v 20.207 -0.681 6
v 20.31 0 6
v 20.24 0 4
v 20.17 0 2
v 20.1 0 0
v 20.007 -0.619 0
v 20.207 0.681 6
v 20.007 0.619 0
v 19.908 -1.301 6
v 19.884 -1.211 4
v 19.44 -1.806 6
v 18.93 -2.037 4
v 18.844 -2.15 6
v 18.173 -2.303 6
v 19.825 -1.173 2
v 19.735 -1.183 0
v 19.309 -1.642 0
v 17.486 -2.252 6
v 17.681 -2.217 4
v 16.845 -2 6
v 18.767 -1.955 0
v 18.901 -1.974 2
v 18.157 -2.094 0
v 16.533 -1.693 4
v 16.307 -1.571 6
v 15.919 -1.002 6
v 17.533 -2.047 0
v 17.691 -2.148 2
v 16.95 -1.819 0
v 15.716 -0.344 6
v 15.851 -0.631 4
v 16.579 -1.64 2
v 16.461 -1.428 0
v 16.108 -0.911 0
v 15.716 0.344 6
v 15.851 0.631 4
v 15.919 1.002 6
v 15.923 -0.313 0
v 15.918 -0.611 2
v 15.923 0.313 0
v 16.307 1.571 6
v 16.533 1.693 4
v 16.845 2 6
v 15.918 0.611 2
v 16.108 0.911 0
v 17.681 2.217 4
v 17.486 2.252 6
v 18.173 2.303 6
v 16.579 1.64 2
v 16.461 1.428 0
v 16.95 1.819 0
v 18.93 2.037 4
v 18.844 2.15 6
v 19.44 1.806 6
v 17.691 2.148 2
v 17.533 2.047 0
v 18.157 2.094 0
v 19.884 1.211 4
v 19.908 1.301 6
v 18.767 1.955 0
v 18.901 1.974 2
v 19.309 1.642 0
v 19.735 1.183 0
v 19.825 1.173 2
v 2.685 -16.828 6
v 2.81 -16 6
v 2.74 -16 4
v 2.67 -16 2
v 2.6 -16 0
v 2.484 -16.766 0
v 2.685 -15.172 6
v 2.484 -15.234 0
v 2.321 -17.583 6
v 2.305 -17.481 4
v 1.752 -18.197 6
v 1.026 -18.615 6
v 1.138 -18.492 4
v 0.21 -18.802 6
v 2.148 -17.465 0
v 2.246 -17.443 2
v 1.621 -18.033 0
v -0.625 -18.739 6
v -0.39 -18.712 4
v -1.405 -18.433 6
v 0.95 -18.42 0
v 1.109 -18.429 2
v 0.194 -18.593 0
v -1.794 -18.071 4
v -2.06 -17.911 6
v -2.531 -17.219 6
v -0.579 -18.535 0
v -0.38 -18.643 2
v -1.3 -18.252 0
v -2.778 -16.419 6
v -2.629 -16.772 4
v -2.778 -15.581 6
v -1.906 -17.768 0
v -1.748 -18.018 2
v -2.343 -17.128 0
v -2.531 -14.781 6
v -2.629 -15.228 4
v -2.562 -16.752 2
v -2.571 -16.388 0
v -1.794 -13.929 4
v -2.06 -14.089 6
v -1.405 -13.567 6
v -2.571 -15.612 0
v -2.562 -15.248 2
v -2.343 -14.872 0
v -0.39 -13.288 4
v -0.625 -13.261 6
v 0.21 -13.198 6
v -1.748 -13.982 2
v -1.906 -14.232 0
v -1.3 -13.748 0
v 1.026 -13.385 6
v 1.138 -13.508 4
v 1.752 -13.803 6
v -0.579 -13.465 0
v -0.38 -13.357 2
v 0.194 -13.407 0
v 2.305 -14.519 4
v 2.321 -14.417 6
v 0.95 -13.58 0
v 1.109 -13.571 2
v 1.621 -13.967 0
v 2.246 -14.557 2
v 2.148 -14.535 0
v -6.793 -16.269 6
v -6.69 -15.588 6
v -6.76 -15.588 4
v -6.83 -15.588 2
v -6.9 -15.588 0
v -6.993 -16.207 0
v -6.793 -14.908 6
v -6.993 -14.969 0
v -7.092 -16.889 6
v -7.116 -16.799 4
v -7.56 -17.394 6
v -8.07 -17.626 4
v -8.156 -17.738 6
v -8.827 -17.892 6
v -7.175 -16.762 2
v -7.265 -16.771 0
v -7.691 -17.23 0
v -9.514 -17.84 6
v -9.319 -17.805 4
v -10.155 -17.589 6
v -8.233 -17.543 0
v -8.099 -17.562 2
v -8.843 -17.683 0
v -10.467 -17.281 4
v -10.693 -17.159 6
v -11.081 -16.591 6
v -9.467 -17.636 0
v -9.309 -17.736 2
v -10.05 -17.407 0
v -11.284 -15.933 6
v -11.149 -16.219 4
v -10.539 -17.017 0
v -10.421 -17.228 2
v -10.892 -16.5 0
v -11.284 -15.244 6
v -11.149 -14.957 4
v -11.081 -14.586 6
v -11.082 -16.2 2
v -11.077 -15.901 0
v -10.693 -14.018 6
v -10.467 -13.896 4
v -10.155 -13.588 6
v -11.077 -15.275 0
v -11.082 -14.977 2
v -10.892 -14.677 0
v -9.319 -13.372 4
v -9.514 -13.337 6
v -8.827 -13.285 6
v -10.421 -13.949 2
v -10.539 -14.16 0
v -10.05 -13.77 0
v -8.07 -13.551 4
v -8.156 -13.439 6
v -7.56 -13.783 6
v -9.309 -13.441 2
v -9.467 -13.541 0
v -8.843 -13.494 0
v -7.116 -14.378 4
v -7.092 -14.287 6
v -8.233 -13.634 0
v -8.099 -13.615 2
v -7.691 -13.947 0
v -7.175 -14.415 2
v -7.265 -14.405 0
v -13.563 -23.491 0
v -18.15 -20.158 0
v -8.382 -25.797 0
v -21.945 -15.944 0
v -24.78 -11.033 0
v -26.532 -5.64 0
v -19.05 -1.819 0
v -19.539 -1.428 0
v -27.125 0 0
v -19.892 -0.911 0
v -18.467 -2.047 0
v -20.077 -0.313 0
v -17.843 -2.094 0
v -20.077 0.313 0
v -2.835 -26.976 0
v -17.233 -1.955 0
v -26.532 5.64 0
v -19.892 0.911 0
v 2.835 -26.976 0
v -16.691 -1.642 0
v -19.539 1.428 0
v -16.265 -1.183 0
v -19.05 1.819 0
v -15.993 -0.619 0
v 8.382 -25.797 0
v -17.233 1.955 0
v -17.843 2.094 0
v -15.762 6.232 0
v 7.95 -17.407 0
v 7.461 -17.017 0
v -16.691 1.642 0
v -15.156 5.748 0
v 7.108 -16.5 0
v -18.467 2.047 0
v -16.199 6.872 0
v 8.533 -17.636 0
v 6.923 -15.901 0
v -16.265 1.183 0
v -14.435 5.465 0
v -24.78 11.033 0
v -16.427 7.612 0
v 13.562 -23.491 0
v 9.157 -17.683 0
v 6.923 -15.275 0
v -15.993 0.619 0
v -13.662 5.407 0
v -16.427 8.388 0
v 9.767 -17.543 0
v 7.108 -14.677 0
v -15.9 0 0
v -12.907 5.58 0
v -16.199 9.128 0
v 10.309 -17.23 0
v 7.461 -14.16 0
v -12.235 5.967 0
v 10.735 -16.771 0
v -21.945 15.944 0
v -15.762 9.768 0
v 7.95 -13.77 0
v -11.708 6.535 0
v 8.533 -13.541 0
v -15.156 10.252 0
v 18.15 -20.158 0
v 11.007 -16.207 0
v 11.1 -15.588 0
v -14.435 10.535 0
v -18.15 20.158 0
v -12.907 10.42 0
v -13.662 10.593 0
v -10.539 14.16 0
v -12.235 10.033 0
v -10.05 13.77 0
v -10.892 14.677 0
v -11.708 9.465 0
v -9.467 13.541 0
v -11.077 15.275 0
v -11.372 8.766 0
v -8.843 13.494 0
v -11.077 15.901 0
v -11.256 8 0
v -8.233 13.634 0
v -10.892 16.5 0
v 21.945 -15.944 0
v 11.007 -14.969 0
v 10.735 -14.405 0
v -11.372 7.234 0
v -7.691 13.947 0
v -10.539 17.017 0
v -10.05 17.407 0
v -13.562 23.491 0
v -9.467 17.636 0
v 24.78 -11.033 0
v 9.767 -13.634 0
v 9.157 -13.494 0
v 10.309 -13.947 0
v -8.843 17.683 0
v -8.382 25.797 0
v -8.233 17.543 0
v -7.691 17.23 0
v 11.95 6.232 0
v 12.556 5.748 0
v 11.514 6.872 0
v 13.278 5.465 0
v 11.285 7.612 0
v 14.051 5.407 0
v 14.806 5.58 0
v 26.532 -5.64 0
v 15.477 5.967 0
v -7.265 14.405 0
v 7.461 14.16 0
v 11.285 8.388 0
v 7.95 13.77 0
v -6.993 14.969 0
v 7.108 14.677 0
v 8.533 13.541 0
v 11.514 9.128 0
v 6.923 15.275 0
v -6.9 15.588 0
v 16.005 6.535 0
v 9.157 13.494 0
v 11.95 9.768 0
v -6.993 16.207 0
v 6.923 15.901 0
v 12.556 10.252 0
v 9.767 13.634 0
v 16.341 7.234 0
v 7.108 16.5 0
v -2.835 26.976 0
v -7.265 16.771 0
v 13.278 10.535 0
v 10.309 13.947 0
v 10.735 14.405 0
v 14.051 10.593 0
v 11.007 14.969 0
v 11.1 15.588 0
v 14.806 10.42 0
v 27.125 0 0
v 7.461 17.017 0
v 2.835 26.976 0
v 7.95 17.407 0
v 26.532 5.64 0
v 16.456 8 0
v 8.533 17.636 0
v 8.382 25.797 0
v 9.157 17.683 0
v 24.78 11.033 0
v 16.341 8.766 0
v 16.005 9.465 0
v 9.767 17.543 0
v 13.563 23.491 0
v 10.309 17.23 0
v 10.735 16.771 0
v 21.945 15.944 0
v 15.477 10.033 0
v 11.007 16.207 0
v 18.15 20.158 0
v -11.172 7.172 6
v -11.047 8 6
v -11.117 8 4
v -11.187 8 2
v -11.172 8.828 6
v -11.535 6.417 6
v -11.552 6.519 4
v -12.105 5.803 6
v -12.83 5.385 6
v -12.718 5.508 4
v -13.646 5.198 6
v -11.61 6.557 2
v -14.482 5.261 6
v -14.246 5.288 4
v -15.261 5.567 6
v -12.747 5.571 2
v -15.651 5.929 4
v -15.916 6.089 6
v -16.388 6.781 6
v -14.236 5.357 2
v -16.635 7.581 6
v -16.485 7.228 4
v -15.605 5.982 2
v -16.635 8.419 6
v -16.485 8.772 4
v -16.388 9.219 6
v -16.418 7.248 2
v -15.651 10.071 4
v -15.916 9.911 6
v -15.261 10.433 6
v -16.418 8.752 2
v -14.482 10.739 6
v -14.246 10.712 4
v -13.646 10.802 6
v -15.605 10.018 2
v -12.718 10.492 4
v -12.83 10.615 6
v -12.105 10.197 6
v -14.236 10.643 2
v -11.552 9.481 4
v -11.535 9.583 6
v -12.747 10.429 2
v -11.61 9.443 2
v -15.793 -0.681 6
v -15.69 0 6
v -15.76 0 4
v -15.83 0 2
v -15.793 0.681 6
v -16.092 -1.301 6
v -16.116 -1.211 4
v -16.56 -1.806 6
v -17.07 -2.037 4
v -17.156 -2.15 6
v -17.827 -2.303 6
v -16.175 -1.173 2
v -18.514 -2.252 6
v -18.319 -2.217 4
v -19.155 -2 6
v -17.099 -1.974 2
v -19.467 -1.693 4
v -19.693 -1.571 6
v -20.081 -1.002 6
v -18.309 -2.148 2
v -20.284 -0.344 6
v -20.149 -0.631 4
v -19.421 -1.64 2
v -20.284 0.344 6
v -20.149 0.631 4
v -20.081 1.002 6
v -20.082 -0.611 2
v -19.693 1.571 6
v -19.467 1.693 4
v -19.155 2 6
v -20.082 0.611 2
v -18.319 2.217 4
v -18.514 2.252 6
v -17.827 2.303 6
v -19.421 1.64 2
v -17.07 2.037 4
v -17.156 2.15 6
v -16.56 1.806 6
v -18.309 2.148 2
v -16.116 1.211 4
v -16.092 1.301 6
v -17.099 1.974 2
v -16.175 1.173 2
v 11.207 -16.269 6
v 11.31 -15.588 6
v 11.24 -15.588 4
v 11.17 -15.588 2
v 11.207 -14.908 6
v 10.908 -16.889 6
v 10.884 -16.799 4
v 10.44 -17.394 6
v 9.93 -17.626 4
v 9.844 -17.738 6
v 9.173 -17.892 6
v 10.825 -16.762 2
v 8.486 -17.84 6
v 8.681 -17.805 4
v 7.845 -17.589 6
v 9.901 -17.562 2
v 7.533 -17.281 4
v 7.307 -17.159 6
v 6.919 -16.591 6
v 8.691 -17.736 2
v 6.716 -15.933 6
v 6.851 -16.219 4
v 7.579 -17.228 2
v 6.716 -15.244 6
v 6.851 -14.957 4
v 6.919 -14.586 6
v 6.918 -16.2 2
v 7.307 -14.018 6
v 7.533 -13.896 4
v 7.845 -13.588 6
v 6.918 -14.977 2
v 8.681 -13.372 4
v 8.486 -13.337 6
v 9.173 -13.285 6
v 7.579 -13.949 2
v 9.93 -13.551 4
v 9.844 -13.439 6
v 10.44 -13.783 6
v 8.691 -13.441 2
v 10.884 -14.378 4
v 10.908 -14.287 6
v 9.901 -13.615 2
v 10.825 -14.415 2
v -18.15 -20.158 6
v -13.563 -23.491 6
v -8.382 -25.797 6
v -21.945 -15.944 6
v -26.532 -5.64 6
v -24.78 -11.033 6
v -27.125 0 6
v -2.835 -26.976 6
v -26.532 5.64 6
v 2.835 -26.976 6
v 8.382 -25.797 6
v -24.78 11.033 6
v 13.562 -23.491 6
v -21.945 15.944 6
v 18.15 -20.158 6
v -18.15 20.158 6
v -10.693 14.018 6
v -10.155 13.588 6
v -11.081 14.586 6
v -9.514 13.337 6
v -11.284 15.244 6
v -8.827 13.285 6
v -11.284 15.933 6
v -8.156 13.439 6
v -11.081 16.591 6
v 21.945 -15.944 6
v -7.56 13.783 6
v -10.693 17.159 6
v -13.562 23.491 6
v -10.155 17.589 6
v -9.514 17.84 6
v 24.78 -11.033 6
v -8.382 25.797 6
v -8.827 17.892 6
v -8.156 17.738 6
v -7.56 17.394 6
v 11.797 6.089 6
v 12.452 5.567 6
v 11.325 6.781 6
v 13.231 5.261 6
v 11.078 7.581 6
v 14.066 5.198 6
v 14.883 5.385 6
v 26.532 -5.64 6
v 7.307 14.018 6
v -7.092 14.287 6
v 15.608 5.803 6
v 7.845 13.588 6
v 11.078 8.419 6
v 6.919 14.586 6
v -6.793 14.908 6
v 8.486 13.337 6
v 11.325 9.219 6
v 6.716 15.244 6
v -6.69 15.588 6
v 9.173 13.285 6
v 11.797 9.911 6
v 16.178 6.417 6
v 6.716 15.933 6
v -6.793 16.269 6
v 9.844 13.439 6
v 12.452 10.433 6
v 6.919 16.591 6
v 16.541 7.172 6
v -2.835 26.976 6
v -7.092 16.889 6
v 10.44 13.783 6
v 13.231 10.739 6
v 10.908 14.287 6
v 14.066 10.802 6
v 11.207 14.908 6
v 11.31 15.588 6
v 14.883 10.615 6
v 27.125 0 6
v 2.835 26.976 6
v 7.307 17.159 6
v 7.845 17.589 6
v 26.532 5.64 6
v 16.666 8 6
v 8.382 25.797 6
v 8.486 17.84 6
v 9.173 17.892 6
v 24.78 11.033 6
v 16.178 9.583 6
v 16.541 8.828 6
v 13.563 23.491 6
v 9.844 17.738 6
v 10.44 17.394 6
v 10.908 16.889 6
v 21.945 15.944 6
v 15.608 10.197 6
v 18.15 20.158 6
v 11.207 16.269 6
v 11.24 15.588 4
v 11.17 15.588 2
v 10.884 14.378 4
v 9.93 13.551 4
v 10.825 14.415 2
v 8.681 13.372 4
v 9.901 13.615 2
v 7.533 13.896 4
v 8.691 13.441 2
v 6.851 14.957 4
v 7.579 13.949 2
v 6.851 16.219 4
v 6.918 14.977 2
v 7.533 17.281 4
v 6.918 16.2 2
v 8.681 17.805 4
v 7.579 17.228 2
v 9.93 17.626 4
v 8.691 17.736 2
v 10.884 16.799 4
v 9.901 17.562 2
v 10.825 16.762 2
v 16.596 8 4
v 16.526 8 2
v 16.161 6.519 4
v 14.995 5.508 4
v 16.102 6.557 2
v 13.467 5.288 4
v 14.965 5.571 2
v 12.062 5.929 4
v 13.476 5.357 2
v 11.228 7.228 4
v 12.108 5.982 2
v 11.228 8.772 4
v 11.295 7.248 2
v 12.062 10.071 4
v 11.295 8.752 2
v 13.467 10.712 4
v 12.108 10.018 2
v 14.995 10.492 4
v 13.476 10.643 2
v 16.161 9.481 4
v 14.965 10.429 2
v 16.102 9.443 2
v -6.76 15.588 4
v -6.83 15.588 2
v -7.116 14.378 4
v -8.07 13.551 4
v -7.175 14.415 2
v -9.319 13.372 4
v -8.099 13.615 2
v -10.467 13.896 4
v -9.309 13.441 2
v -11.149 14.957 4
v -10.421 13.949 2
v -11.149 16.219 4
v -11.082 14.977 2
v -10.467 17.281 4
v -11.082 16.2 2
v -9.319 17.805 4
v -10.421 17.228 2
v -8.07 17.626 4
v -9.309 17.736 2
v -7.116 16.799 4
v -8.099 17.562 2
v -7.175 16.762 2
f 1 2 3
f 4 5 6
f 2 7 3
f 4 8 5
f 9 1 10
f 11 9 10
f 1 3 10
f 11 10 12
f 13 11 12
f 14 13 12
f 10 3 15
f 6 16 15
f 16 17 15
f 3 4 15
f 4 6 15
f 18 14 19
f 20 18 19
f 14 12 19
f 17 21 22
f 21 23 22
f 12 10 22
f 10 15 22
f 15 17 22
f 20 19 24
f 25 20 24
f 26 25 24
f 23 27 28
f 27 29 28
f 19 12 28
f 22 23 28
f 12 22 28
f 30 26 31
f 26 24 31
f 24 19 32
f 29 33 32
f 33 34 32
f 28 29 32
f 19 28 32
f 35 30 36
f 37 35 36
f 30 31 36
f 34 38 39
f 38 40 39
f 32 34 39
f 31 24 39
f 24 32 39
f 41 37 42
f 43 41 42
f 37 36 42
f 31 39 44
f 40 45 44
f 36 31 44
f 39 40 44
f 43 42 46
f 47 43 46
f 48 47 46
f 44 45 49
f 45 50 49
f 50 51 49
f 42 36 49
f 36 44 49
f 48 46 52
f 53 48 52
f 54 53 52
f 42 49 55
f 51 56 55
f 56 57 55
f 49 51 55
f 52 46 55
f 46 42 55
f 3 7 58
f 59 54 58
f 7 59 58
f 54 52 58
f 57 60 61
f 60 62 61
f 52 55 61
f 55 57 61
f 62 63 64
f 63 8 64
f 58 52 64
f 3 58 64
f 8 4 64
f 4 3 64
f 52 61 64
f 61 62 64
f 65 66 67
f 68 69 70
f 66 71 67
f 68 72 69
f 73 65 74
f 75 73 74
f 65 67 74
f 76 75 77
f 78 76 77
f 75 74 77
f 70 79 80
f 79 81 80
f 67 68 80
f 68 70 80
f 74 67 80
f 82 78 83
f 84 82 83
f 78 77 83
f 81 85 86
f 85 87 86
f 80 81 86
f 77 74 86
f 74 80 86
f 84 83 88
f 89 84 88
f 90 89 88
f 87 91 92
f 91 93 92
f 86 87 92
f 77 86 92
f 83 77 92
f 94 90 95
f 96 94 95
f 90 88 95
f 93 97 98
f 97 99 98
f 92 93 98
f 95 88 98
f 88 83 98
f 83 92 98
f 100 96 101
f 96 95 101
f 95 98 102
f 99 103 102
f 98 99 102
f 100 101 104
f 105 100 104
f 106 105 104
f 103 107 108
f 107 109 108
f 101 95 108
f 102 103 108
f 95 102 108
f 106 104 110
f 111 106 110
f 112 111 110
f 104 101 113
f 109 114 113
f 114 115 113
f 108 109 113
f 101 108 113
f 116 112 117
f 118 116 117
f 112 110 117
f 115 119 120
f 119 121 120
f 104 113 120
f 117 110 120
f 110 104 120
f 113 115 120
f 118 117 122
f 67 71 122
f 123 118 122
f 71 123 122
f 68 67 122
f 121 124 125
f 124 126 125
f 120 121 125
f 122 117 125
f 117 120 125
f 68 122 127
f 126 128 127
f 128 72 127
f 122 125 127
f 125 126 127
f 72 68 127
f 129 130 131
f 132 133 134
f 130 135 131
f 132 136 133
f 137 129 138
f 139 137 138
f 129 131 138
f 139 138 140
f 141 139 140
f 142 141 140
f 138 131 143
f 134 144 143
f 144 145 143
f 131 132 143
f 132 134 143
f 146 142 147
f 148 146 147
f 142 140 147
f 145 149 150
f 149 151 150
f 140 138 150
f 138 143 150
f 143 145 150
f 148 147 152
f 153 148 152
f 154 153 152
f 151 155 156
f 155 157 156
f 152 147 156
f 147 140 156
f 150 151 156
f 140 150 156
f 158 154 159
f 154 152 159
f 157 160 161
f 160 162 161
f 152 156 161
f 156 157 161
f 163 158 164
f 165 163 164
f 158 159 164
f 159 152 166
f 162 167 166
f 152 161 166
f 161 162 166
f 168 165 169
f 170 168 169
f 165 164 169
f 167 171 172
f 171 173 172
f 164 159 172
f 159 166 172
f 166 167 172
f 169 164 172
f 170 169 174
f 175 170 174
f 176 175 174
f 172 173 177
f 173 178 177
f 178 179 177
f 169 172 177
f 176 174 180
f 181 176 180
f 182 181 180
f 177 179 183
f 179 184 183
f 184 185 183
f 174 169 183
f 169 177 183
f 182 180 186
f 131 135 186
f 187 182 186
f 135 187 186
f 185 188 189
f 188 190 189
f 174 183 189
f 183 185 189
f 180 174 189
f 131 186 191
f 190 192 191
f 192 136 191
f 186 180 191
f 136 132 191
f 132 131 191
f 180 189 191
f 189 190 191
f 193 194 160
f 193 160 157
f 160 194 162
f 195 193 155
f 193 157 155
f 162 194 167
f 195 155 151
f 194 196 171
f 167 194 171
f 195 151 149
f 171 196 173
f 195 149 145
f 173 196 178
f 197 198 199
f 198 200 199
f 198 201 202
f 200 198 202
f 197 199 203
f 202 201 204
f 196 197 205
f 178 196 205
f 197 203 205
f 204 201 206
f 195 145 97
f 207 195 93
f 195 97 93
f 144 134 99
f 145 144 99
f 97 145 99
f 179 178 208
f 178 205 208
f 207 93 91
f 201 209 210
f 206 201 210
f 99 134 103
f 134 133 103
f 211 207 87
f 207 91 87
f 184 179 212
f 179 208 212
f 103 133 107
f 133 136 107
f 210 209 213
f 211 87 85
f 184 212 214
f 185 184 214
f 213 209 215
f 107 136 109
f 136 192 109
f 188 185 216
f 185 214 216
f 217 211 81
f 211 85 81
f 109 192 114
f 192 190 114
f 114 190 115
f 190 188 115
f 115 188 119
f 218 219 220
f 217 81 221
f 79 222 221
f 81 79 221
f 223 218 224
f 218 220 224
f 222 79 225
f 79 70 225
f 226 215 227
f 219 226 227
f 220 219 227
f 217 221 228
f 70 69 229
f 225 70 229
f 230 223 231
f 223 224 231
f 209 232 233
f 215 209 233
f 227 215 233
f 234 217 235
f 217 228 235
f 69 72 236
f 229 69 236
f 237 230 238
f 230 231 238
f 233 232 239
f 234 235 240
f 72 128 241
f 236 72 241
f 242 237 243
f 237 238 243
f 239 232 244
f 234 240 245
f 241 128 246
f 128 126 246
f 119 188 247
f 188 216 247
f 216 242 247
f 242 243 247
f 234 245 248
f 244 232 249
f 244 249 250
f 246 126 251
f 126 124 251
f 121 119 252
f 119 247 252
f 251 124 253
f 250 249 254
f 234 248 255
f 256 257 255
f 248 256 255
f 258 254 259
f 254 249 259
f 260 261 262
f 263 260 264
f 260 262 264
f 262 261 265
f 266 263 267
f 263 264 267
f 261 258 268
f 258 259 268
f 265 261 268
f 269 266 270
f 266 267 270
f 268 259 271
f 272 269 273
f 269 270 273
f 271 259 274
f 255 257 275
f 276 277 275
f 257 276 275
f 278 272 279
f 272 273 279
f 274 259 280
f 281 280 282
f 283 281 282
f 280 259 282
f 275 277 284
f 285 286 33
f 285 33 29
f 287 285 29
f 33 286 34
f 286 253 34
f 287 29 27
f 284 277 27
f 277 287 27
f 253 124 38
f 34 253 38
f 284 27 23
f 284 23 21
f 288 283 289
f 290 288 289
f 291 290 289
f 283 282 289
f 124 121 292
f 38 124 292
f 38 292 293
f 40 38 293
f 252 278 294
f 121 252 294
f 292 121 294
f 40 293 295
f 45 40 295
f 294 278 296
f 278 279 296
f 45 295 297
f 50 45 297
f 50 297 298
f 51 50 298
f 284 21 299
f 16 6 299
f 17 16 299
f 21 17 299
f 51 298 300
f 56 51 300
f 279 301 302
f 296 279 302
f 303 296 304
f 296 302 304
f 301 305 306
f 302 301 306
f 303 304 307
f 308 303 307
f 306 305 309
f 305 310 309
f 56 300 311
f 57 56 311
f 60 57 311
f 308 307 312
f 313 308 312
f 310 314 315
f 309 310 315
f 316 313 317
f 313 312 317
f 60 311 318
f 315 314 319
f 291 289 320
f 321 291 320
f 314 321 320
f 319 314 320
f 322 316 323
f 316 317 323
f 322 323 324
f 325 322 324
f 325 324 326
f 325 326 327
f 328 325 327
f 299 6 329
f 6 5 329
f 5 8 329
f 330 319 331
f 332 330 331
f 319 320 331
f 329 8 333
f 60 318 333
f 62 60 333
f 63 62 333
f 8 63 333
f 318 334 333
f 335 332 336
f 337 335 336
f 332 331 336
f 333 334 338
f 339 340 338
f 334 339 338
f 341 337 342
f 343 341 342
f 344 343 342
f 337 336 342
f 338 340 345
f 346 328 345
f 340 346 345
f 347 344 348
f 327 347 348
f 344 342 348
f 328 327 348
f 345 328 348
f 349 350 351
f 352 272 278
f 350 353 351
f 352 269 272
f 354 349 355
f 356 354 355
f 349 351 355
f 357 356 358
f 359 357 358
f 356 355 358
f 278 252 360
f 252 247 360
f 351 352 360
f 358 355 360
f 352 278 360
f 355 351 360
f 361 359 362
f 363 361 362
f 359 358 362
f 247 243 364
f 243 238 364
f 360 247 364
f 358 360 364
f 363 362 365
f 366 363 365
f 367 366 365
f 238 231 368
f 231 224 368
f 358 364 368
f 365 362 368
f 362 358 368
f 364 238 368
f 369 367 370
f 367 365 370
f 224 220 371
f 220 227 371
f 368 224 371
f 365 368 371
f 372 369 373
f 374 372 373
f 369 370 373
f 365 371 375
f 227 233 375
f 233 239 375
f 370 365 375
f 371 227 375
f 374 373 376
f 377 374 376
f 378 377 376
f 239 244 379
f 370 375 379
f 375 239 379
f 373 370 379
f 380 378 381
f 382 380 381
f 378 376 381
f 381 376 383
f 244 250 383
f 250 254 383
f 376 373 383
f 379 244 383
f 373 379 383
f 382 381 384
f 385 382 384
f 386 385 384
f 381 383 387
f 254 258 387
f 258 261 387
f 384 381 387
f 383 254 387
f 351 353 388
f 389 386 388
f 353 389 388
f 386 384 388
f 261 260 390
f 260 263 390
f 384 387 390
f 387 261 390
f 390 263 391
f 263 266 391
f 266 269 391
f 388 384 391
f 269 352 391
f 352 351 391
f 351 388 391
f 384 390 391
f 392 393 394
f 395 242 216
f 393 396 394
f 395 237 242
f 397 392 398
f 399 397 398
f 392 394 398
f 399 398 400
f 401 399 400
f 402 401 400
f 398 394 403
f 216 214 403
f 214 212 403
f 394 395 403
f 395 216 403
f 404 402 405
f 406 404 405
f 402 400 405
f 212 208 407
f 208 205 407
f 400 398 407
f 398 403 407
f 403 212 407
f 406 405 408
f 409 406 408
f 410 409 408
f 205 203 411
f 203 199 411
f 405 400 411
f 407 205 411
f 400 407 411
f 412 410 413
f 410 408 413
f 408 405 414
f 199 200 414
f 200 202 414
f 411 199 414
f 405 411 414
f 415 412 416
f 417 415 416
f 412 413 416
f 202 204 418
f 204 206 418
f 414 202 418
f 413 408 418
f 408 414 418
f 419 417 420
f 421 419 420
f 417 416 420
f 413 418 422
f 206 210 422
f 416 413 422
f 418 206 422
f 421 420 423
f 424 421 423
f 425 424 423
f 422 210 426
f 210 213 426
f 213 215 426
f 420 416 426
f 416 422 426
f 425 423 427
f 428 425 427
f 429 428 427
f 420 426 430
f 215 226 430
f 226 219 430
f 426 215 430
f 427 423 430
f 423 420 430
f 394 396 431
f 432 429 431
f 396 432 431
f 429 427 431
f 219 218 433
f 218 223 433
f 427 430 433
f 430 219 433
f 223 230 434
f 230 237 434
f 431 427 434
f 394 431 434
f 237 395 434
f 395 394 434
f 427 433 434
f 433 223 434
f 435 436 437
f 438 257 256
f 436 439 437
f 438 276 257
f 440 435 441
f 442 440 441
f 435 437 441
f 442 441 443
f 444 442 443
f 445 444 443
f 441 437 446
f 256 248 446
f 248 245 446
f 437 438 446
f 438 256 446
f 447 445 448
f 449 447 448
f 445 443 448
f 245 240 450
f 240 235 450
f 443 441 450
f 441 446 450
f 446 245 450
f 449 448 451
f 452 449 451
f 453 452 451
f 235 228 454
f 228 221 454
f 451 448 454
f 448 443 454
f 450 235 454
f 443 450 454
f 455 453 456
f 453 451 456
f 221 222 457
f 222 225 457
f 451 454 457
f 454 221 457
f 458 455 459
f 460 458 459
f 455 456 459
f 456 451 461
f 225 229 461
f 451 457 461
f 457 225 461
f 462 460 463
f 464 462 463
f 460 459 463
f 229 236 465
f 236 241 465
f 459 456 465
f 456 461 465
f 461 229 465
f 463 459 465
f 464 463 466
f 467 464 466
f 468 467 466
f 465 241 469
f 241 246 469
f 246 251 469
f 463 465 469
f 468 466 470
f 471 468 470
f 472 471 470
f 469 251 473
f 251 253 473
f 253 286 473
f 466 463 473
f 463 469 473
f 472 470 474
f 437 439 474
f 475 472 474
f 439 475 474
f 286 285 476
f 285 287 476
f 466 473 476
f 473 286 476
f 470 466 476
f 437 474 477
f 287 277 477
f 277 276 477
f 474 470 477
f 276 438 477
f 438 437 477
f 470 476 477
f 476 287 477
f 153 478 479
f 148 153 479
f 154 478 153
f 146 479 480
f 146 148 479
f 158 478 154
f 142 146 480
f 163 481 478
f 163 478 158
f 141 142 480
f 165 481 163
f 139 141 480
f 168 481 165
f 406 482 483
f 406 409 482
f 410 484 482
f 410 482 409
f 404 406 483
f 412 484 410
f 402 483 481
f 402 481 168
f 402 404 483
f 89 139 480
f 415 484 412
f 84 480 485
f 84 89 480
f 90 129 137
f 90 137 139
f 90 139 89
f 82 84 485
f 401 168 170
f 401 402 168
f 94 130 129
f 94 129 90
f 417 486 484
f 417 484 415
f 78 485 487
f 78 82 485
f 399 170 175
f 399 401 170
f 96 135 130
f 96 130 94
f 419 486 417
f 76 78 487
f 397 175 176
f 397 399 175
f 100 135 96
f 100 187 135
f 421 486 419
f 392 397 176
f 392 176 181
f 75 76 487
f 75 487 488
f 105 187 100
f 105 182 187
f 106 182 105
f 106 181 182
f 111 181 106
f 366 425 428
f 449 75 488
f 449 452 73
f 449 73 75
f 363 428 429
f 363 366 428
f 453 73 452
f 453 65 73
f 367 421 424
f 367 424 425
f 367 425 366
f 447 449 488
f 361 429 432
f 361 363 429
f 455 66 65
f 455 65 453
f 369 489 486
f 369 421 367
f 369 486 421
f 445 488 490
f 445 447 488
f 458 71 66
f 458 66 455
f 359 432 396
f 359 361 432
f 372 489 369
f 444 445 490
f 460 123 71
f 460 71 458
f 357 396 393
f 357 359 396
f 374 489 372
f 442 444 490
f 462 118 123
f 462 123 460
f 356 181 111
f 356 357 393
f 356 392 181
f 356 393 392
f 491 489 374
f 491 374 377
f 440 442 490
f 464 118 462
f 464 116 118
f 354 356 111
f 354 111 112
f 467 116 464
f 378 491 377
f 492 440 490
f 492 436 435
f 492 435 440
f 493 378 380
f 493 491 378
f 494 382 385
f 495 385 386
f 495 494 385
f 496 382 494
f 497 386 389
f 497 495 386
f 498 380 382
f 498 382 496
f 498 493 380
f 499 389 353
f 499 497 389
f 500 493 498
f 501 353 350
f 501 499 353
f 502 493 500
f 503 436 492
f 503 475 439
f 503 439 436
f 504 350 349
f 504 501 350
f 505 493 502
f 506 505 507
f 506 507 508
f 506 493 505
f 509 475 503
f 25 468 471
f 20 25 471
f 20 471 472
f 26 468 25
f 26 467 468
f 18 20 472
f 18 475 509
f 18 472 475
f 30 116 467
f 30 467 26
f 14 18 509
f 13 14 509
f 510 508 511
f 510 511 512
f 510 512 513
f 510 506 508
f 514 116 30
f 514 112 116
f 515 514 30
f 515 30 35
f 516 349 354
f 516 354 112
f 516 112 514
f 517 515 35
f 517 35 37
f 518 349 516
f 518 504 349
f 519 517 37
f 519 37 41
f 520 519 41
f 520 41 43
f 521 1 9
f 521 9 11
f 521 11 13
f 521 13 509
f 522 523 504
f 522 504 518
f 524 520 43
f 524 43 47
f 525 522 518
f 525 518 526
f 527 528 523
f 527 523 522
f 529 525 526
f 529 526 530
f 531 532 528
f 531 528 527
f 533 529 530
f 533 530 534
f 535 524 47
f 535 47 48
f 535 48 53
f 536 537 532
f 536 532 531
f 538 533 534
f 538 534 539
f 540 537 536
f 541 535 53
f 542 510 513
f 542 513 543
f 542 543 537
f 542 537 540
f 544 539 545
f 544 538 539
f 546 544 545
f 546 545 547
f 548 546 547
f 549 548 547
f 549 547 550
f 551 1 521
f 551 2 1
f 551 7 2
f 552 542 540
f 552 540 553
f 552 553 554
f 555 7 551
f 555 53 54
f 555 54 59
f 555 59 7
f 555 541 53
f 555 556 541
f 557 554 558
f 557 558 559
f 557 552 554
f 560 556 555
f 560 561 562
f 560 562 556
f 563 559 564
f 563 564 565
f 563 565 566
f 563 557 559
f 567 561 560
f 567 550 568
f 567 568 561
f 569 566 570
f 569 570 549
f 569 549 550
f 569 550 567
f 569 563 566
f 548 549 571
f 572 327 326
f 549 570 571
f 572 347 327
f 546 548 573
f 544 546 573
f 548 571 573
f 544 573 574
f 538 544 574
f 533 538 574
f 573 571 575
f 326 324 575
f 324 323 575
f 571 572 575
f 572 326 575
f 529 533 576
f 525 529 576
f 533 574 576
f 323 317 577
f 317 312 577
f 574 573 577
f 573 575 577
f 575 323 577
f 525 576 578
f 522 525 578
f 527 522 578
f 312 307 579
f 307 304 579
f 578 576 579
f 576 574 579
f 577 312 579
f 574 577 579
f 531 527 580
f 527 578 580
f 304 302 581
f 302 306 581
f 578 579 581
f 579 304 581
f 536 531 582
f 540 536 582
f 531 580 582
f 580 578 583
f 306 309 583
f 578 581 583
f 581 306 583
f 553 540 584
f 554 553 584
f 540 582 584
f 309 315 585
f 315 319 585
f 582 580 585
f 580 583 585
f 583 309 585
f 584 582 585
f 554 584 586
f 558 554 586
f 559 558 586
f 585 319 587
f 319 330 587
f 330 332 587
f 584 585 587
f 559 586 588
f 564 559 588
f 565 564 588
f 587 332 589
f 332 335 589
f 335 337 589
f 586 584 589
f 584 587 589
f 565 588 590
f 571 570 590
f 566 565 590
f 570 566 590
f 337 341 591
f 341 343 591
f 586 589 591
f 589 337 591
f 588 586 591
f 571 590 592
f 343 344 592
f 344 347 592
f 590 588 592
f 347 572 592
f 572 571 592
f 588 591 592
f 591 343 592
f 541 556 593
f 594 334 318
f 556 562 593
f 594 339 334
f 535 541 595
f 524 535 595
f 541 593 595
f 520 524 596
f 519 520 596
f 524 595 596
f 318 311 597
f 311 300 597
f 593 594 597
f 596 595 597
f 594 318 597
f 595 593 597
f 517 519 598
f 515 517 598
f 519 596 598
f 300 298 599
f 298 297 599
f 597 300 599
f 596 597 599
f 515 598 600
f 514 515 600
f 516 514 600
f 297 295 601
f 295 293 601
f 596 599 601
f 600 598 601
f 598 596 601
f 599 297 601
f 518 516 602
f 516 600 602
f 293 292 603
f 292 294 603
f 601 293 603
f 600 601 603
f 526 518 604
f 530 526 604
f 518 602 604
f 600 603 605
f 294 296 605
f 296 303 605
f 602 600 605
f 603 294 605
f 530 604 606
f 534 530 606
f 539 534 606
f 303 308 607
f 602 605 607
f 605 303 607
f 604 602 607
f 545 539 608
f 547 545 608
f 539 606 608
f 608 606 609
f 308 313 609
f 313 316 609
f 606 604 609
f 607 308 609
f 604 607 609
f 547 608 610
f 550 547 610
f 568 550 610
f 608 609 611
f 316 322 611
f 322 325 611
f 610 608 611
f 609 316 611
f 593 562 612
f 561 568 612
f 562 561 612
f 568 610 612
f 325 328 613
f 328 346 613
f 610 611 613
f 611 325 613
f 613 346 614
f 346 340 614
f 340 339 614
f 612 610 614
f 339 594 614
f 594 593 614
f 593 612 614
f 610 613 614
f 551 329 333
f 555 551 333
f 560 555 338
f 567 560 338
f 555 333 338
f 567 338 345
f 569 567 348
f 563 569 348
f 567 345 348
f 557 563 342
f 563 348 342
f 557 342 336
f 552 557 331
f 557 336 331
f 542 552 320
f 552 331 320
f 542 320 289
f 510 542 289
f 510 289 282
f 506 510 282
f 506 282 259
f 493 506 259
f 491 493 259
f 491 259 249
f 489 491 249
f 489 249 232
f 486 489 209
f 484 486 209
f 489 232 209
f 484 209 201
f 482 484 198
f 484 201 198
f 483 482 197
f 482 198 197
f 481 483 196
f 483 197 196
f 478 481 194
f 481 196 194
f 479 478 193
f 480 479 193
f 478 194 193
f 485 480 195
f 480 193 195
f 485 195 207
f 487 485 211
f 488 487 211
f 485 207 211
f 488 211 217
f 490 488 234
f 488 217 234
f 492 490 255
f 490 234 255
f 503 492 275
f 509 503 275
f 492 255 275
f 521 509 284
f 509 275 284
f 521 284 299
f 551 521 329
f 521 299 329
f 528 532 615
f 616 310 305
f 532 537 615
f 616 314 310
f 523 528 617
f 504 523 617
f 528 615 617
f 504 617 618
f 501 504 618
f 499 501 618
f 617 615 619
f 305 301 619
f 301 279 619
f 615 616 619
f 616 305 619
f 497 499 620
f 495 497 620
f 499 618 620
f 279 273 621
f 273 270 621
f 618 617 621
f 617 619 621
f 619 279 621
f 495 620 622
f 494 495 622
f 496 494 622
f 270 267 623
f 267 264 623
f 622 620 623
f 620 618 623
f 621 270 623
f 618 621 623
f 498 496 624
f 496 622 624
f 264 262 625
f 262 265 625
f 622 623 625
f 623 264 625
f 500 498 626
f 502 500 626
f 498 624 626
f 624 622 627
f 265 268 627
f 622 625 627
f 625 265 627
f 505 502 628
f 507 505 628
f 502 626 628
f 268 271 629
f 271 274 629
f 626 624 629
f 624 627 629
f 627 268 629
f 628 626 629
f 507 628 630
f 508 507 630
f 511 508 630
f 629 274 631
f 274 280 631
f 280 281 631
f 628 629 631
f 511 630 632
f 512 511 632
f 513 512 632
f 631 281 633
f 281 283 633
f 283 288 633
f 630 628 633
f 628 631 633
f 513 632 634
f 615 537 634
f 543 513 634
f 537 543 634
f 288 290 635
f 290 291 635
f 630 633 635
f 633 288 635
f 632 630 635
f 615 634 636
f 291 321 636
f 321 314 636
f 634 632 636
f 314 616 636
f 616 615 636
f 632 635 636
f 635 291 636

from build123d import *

# Parameters (mm, degrees)
SKETCH1_R                    = 27.125
BOSS_EXTRUDE1_DEPTH          = 6
CUT_EXTRUDE1_START           = 6
SKETCH2_R                    = 2.6
CUT_EXTRUDE1_DEPTH           = 45.826939745
CUT_EXTRUDE1_DRAFT           = 2
CUT_EXTRUDE1_PROFILE_2_DEPTH = 45.826939745
CUT_EXTRUDE1_PROFILE_2_DRAFT = 2
CUT_EXTRUDE1_PROFILE_3_DEPTH = 45.826939745
CUT_EXTRUDE1_PROFILE_3_DRAFT = 2
SKETCH2_R_2                  = 2.1
CUT_EXTRUDE1_PROFILE_4_DEPTH = 45.826939745
CUT_EXTRUDE1_PROFILE_4_DRAFT = 2
CUT_EXTRUDE1_PROFILE_5_DEPTH = 45.826939745
CUT_EXTRUDE1_PROFILE_5_DRAFT = 2
CUT_EXTRUDE1_PROFILE_6_DEPTH = 45.826939745
CUT_EXTRUDE1_PROFILE_6_DRAFT = 2
CUT_EXTRUDE1_PROFILE_7_DEPTH = 45.826939745
CUT_EXTRUDE1_PROFILE_7_DRAFT = 2
CUT_EXTRUDE1_PROFILE_8_DEPTH = 45.826939745
CUT_EXTRUDE1_PROFILE_8_DRAFT = 2
CUT_EXTRUDE1_PROFILE_9_DEPTH = 45.826939745
CUT_EXTRUDE1_PROFILE_9_DRAFT = 2


with BuildPart() as part:
    # Sketch1 → Boss-Extrude1 (new body)
    with BuildSketch(Plane(origin=(0, 0, 0), x_dir=(0, 1, 0), z_dir=(0, 0, 1))):
        with Locations(Location((0, 0, 0), (0, 0, 270))):
            Circle(SKETCH1_R)
    extrude(amount=BOSS_EXTRUDE1_DEPTH)


with BuildPart() as cut_extrude1_tool:
    # Sketch2 → Cut-Extrude1 (with draft: the straight prism first)
    with BuildSketch(Plane(origin=(0, 0, 6), x_dir=(1, 0, 0), z_dir=(0, 0, -1)).offset(CUT_EXTRUDE1_START)):
        with Locations((0, 16)):
            Circle(SKETCH2_R)
    extrude(amount=-CUT_EXTRUDE1_DEPTH)
    # Cut-Extrude1: the draft: its side faces are tilted about the plane it starts from
    cut_extrude1_sides = [cut_extrude1_tool.faces().sort_by_distance(p)[0] for p in [
        (-2.6, -16, 22.913469873),
    ]]
    draft(cut_extrude1_sides, Plane(origin=(0, 0, 6), x_dir=(1, 0, 0), z_dir=(0, 0, -1)).offset(CUT_EXTRUDE1_START), CUT_EXTRUDE1_DRAFT)


with BuildPart() as part_1:
    add(part.part)

    # Cut-Extrude1: cut by cut_extrude1_tool
    add(cut_extrude1_tool.part, mode=Mode.SUBTRACT)


with BuildPart() as cut_extrude1_profile_2_tool:
    # Sketch2 → Cut-Extrude1 profile 2 (with draft: the straight prism first)
    with BuildSketch(Plane(origin=(0, 0, 6), x_dir=(1, 0, 0), z_dir=(0, 0, -1)).offset(CUT_EXTRUDE1_START)):
        with Locations((13.856406461, -8)):
            Circle(SKETCH2_R)
    extrude(amount=-CUT_EXTRUDE1_PROFILE_2_DEPTH)
    # Cut-Extrude1 profile 2: the draft: its side faces are tilted about the plane it starts from
    cut_extrude1_profile_2_sides = [cut_extrude1_profile_2_tool.faces().sort_by_distance(p)[0] for p in [
        (11.256406461, 8, 22.913469873),
    ]]
    draft(cut_extrude1_profile_2_sides, Plane(origin=(0, 0, 6), x_dir=(1, 0, 0), z_dir=(0, 0, -1)).offset(CUT_EXTRUDE1_START), CUT_EXTRUDE1_PROFILE_2_DRAFT)


with BuildPart() as part_2:
    add(part_1.part)

    # Cut-Extrude1 profile 2: cut by cut_extrude1_profile_2_tool
    add(cut_extrude1_profile_2_tool.part, mode=Mode.SUBTRACT)


with BuildPart() as cut_extrude1_profile_3_tool:
    # Sketch2 → Cut-Extrude1 profile 3 (with draft: the straight prism first)
    with BuildSketch(Plane(origin=(0, 0, 6), x_dir=(1, 0, 0), z_dir=(0, 0, -1)).offset(CUT_EXTRUDE1_START)):
        with Locations((-13.856406461, -8)):
            Circle(SKETCH2_R)
    extrude(amount=-CUT_EXTRUDE1_PROFILE_3_DEPTH)
    # Cut-Extrude1 profile 3: the draft: its side faces are tilted about the plane it starts from
    cut_extrude1_profile_3_sides = [cut_extrude1_profile_3_tool.faces().sort_by_distance(p)[0] for p in [
        (-16.456406461, 8, 22.913469873),
    ]]
    draft(cut_extrude1_profile_3_sides, Plane(origin=(0, 0, 6), x_dir=(1, 0, 0), z_dir=(0, 0, -1)).offset(CUT_EXTRUDE1_START), CUT_EXTRUDE1_PROFILE_3_DRAFT)


with BuildPart() as part_3:
    add(part_2.part)

    # Cut-Extrude1 profile 3: cut by cut_extrude1_profile_3_tool
    add(cut_extrude1_profile_3_tool.part, mode=Mode.SUBTRACT)


with BuildPart() as cut_extrude1_profile_4_tool:
    # Sketch2 → Cut-Extrude1 profile 4 (with draft: the straight prism first)
    with BuildSketch(Plane(origin=(0, 0, 6), x_dir=(1, 0, 0), z_dir=(0, 0, -1)).offset(CUT_EXTRUDE1_START)):
        with Locations((-9, -15.588457268)):
            Circle(SKETCH2_R_2)
    extrude(amount=-CUT_EXTRUDE1_PROFILE_4_DEPTH)
    # Cut-Extrude1 profile 4: the draft: its side faces are tilted about the plane it starts from
    cut_extrude1_profile_4_sides = [cut_extrude1_profile_4_tool.faces().sort_by_distance(p)[0] for p in [
        (-11.1, 15.588457268, 22.913469873),
    ]]
    draft(cut_extrude1_profile_4_sides, Plane(origin=(0, 0, 6), x_dir=(1, 0, 0), z_dir=(0, 0, -1)).offset(CUT_EXTRUDE1_START), CUT_EXTRUDE1_PROFILE_4_DRAFT)


with BuildPart() as part_4:
    add(part_3.part)

    # Cut-Extrude1 profile 4: cut by cut_extrude1_profile_4_tool
    add(cut_extrude1_profile_4_tool.part, mode=Mode.SUBTRACT)


with BuildPart() as cut_extrude1_profile_5_tool:
    # Sketch2 → Cut-Extrude1 profile 5 (with draft: the straight prism first)
    with BuildSketch(Plane(origin=(0, 0, 6), x_dir=(1, 0, 0), z_dir=(0, 0, -1)).offset(CUT_EXTRUDE1_START)):
        with Locations((-18, 0)):
            Circle(SKETCH2_R_2)
    extrude(amount=-CUT_EXTRUDE1_PROFILE_5_DEPTH)
    # Cut-Extrude1 profile 5: the draft: its side faces are tilted about the plane it starts from
    cut_extrude1_profile_5_sides = [cut_extrude1_profile_5_tool.faces().sort_by_distance(p)[0] for p in [
        (-20.1, 0, 22.913469873),
    ]]
    draft(cut_extrude1_profile_5_sides, Plane(origin=(0, 0, 6), x_dir=(1, 0, 0), z_dir=(0, 0, -1)).offset(CUT_EXTRUDE1_START), CUT_EXTRUDE1_PROFILE_5_DRAFT)


with BuildPart() as part_5:
    add(part_4.part)

    # Cut-Extrude1 profile 5: cut by cut_extrude1_profile_5_tool
    add(cut_extrude1_profile_5_tool.part, mode=Mode.SUBTRACT)


with BuildPart() as cut_extrude1_profile_6_tool:
    # Sketch2 → Cut-Extrude1 profile 6 (with draft: the straight prism first)
    with BuildSketch(Plane(origin=(0, 0, 6), x_dir=(1, 0, 0), z_dir=(0, 0, -1)).offset(CUT_EXTRUDE1_START)):
        with Locations((-9, 15.588457268)):
            Circle(SKETCH2_R_2)
    extrude(amount=-CUT_EXTRUDE1_PROFILE_6_DEPTH)
    # Cut-Extrude1 profile 6: the draft: its side faces are tilted about the plane it starts from
    cut_extrude1_profile_6_sides = [cut_extrude1_profile_6_tool.faces().sort_by_distance(p)[0] for p in [
        (-11.1, -15.588457268, 22.913469873),
    ]]
    draft(cut_extrude1_profile_6_sides, Plane(origin=(0, 0, 6), x_dir=(1, 0, 0), z_dir=(0, 0, -1)).offset(CUT_EXTRUDE1_START), CUT_EXTRUDE1_PROFILE_6_DRAFT)


with BuildPart() as part_6:
    add(part_5.part)

    # Cut-Extrude1 profile 6: cut by cut_extrude1_profile_6_tool
    add(cut_extrude1_profile_6_tool.part, mode=Mode.SUBTRACT)


with BuildPart() as cut_extrude1_profile_7_tool:
    # Sketch2 → Cut-Extrude1 profile 7 (with draft: the straight prism first)
    with BuildSketch(Plane(origin=(0, 0, 6), x_dir=(1, 0, 0), z_dir=(0, 0, -1)).offset(CUT_EXTRUDE1_START)):
        with Locations((9, 15.588457268)):
            Circle(SKETCH2_R_2)
    extrude(amount=-CUT_EXTRUDE1_PROFILE_7_DEPTH)
    # Cut-Extrude1 profile 7: the draft: its side faces are tilted about the plane it starts from
    cut_extrude1_profile_7_sides = [cut_extrude1_profile_7_tool.faces().sort_by_distance(p)[0] for p in [
        (6.9, -15.588457268, 22.913469873),
    ]]
    draft(cut_extrude1_profile_7_sides, Plane(origin=(0, 0, 6), x_dir=(1, 0, 0), z_dir=(0, 0, -1)).offset(CUT_EXTRUDE1_START), CUT_EXTRUDE1_PROFILE_7_DRAFT)


with BuildPart() as part_7:
    add(part_6.part)

    # Cut-Extrude1 profile 7: cut by cut_extrude1_profile_7_tool
    add(cut_extrude1_profile_7_tool.part, mode=Mode.SUBTRACT)


with BuildPart() as cut_extrude1_profile_8_tool:
    # Sketch2 → Cut-Extrude1 profile 8 (with draft: the straight prism first)
    with BuildSketch(Plane(origin=(0, 0, 6), x_dir=(1, 0, 0), z_dir=(0, 0, -1)).offset(CUT_EXTRUDE1_START)):
        with Locations((18, 0)):
            Circle(SKETCH2_R_2)
    extrude(amount=-CUT_EXTRUDE1_PROFILE_8_DEPTH)
    # Cut-Extrude1 profile 8: the draft: its side faces are tilted about the plane it starts from
    cut_extrude1_profile_8_sides = [cut_extrude1_profile_8_tool.faces().sort_by_distance(p)[0] for p in [
        (15.9, 0, 22.913469873),
    ]]
    draft(cut_extrude1_profile_8_sides, Plane(origin=(0, 0, 6), x_dir=(1, 0, 0), z_dir=(0, 0, -1)).offset(CUT_EXTRUDE1_START), CUT_EXTRUDE1_PROFILE_8_DRAFT)


with BuildPart() as part_8:
    add(part_7.part)

    # Cut-Extrude1 profile 8: cut by cut_extrude1_profile_8_tool
    add(cut_extrude1_profile_8_tool.part, mode=Mode.SUBTRACT)


with BuildPart() as cut_extrude1_profile_9_tool:
    # Sketch2 → Cut-Extrude1 profile 9 (with draft: the straight prism first)
    with BuildSketch(Plane(origin=(0, 0, 6), x_dir=(1, 0, 0), z_dir=(0, 0, -1)).offset(CUT_EXTRUDE1_START)):
        with Locations((9, -15.588457268)):
            Circle(SKETCH2_R_2)
    extrude(amount=-CUT_EXTRUDE1_PROFILE_9_DEPTH)
    # Cut-Extrude1 profile 9: the draft: its side faces are tilted about the plane it starts from
    cut_extrude1_profile_9_sides = [cut_extrude1_profile_9_tool.faces().sort_by_distance(p)[0] for p in [
        (6.9, 15.588457268, 22.913469873),
    ]]
    draft(cut_extrude1_profile_9_sides, Plane(origin=(0, 0, 6), x_dir=(1, 0, 0), z_dir=(0, 0, -1)).offset(CUT_EXTRUDE1_START), CUT_EXTRUDE1_PROFILE_9_DRAFT)


with BuildPart() as part_9:
    add(part_8.part)

    # Cut-Extrude1 profile 9: cut by cut_extrude1_profile_9_tool
    add(cut_extrude1_profile_9_tool.part, mode=Mode.SUBTRACT)


solid = part_9.part
